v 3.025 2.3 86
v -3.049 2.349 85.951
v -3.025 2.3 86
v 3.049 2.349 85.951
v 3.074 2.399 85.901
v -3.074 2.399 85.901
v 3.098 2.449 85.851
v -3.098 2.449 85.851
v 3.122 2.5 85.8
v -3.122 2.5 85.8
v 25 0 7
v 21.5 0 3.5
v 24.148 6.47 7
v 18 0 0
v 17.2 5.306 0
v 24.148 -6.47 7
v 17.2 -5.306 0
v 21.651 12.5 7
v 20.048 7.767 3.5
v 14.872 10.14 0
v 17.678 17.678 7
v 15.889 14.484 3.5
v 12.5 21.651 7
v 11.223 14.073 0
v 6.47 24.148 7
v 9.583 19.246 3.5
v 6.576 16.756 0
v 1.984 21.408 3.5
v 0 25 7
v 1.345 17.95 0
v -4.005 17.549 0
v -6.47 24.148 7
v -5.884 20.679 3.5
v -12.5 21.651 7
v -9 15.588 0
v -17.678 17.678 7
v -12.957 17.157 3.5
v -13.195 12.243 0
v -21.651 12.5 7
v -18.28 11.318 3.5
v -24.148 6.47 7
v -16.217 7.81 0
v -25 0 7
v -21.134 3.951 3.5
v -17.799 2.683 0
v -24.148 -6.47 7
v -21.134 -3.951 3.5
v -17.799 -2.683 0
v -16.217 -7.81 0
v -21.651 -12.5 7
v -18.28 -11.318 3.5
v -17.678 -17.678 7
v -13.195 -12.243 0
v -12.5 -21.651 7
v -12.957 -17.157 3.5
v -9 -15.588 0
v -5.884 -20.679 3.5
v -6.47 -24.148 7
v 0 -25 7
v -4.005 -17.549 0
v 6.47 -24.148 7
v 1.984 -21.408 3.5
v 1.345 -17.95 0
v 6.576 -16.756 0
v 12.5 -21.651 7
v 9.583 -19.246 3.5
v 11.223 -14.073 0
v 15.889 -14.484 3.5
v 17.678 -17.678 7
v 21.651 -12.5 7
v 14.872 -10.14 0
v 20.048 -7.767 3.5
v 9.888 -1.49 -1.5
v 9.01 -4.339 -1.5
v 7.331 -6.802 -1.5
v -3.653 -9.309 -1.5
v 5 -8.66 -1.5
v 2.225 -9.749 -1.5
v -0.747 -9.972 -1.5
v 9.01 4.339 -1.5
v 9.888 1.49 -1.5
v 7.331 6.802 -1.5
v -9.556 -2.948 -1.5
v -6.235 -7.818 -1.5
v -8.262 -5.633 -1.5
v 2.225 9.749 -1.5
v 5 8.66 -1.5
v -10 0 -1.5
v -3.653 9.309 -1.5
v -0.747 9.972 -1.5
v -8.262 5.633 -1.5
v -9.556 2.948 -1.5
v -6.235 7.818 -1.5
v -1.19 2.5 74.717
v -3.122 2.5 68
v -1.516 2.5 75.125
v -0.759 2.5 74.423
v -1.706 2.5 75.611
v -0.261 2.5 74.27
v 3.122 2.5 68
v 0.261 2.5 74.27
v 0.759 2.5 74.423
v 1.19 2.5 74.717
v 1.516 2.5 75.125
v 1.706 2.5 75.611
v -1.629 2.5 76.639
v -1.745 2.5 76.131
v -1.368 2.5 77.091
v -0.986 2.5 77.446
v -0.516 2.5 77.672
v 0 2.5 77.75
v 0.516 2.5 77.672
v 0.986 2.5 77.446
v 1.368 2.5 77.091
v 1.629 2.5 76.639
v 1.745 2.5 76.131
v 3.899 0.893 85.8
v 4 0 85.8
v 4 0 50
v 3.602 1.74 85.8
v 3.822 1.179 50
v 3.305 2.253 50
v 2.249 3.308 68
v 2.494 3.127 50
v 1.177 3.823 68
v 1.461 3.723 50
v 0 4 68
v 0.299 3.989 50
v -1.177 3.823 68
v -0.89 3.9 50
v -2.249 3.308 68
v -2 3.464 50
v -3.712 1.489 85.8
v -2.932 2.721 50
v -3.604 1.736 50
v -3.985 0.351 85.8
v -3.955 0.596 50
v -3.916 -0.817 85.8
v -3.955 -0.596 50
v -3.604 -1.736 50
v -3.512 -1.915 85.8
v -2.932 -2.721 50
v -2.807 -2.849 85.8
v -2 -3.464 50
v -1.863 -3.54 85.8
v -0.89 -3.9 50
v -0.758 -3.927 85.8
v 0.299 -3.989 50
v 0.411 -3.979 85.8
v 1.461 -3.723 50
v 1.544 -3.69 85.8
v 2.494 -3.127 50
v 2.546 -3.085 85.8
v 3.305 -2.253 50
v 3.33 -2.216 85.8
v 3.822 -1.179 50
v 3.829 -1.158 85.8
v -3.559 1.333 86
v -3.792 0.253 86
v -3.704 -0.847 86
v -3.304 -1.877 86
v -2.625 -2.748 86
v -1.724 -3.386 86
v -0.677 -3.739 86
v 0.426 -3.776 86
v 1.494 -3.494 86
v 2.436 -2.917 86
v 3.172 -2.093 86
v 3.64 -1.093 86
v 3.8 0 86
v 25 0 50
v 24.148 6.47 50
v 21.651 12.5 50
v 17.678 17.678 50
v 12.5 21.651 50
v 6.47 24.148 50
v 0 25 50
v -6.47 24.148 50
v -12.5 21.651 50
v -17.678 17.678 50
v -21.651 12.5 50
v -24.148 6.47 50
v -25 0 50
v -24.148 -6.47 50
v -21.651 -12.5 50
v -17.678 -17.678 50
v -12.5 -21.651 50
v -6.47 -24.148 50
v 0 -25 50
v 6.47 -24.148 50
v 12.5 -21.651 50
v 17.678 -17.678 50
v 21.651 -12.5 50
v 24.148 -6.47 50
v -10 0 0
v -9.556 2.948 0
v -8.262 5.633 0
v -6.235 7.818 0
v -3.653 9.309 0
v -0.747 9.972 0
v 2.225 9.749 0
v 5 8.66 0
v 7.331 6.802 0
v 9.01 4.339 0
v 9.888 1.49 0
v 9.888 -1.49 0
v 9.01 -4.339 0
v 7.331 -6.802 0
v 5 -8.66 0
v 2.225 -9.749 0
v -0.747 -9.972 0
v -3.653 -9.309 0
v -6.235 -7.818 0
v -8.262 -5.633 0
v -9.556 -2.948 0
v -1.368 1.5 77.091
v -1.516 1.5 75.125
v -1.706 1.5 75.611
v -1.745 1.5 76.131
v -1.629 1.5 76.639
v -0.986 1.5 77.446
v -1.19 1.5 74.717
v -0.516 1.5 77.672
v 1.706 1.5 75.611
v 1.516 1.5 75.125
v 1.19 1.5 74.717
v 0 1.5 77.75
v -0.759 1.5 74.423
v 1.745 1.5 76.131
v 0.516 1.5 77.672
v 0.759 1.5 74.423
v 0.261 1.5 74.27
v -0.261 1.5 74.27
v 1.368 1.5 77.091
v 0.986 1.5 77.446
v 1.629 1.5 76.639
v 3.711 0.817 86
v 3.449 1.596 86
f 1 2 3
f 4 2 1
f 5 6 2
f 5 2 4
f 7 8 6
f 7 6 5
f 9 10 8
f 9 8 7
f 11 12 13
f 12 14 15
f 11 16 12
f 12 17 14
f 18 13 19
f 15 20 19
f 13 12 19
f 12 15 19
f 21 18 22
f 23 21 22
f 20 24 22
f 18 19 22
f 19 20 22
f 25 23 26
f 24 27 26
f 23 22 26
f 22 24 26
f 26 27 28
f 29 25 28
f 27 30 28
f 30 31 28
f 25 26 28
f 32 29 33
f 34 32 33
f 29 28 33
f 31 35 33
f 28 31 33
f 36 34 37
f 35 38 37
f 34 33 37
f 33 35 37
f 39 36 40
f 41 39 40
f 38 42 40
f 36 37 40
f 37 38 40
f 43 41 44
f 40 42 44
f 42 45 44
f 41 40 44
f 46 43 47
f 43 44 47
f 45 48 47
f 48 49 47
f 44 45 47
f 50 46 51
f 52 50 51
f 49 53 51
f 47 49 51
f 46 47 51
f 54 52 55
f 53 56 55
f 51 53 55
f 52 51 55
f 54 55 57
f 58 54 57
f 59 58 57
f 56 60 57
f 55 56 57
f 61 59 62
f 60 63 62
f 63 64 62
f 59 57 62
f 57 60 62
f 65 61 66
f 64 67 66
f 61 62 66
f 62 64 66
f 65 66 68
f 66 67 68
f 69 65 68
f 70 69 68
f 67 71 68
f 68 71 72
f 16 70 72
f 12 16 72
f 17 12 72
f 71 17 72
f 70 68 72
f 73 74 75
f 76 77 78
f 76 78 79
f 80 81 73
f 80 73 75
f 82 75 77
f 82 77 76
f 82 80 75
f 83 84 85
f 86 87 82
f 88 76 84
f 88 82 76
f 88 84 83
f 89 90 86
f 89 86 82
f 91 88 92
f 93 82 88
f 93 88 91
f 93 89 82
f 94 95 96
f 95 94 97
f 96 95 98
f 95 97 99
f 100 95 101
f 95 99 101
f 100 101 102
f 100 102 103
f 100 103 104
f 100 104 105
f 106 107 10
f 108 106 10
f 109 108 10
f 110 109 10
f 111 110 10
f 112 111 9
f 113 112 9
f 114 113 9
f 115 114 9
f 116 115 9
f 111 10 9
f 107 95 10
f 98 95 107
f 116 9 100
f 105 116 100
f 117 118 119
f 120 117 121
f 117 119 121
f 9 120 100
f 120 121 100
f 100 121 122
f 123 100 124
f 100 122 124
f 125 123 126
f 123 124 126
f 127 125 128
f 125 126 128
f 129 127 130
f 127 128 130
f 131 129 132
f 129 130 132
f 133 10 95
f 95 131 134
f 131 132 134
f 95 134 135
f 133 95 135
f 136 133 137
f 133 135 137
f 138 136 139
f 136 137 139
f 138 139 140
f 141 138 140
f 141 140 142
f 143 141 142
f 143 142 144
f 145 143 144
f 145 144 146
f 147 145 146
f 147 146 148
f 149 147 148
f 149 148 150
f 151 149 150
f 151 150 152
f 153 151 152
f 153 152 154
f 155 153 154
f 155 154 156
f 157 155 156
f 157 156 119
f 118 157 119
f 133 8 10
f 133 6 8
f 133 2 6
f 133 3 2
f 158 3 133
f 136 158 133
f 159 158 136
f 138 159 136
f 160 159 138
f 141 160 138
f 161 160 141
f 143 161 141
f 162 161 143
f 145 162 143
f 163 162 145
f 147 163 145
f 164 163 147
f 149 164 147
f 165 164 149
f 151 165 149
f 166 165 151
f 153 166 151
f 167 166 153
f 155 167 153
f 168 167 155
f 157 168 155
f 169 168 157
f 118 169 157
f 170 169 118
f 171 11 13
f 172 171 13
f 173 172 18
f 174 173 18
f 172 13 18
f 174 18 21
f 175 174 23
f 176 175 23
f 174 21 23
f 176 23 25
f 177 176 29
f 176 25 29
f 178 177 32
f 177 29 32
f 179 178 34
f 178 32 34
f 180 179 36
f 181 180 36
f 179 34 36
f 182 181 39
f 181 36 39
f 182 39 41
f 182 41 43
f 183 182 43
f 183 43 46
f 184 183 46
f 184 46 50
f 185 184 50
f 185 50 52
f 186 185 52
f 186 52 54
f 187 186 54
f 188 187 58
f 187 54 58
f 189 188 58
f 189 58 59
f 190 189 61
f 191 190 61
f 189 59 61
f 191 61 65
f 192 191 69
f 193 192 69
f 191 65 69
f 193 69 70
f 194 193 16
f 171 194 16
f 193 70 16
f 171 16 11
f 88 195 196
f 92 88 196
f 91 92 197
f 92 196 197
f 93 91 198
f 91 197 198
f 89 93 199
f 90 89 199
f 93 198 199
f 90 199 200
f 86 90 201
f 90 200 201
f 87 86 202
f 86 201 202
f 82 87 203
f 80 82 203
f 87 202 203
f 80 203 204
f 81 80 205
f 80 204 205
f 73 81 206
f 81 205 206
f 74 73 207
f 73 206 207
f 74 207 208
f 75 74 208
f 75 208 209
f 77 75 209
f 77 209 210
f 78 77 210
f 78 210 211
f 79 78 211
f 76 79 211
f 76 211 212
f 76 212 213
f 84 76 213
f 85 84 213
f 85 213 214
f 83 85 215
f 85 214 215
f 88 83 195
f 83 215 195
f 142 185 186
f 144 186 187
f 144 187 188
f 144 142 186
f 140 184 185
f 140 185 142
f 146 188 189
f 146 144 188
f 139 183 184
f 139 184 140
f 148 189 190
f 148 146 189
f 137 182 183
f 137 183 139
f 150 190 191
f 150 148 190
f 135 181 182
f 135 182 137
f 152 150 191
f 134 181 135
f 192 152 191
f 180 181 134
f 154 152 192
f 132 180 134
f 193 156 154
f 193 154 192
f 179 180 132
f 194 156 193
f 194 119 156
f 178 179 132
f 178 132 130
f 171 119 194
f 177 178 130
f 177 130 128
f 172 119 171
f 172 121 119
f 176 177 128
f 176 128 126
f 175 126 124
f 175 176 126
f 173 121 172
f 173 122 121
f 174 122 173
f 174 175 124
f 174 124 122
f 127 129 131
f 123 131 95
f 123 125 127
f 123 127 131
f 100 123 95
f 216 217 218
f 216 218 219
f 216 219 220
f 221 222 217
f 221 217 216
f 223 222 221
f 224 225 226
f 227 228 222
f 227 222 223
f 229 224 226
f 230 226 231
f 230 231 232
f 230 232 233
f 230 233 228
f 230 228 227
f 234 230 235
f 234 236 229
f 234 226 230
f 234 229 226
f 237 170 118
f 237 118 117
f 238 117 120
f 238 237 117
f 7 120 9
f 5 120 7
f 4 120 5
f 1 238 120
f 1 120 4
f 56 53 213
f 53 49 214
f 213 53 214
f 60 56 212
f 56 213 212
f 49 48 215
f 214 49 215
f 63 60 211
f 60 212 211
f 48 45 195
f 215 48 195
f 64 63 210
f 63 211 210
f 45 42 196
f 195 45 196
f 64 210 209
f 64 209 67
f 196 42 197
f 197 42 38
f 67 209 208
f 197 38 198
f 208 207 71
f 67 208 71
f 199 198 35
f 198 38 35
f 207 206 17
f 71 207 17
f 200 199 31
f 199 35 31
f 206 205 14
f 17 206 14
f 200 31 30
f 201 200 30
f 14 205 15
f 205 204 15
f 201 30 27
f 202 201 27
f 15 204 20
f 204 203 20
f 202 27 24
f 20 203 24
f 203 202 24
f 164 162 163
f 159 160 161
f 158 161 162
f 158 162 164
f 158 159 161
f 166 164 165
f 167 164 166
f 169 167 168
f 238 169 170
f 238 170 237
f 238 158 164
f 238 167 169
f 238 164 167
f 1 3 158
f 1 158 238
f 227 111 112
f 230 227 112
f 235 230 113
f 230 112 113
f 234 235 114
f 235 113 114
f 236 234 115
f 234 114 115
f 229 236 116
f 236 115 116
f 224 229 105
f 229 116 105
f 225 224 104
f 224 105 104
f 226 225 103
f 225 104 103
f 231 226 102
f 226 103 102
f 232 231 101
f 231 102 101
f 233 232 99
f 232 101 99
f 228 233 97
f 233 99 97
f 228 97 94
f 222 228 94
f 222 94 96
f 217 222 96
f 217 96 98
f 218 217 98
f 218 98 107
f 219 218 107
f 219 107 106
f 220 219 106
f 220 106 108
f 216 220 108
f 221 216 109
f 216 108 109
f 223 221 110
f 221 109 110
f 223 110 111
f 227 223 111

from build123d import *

# Parameters (mm, degrees)
SKETCH_1_R          = 25
EXTRUDE_1_DEPTH     = 50
CHAMFER_1_SIZE      = 7
SKETCH_2_R          = 10
EXTRUDE_2_DEPTH     = 1.5
SKETCH_3_R          = 4
EXTRUDE_3_DEPTH     = 36
CUT_EXTRUDE_1_DEPTH = 18
SKETCH_5_R          = 1.75
CUT_EXTRUDE_2_DEPTH = 1
CHAMFER_2_SIZE      = 0.2


with BuildPart() as part:
    # 草图1 → 凸台-拉伸1 (new body)
    with BuildSketch(Plane.XY):
        Circle(SKETCH_1_R)
    extrude(amount=EXTRUDE_1_DEPTH)

    # 倒角1
    chamfer_1_edges = [part.edges().sort_by_distance(p)[0] for p in [
        (-25, 0, 0),
    ]]
    chamfer(chamfer_1_edges, length=CHAMFER_1_SIZE)

    # 草图2 → 凸台-拉伸2 (add)
    with BuildSketch(Plane(origin=(0, 0, 0), x_dir=(-1, 0, 0), z_dir=(0, 0, -1))):
        Circle(SKETCH_2_R)
    extrude(amount=EXTRUDE_2_DEPTH)

    # 草图3 → 凸台-拉伸3 (add)
    with BuildSketch(Plane.XY.offset(50)):
        Circle(SKETCH_3_R)
    extrude(amount=EXTRUDE_3_DEPTH)

    # 草图4 → 切除-拉伸1 (cut)
    with BuildSketch(Plane.XY.offset(86)):
        Polygon((-91.7895175, 2.5), (-3.122498999, 2.5), (3.122498999, 2.5), (91.7895175, 2.5), (91.7895175, 179.834037002), (-91.7895175, 179.834037002), align=None)
    extrude(amount=-CUT_EXTRUDE_1_DEPTH, mode=Mode.SUBTRACT)

    # 草图5 → 切除-拉伸2 (cut)
    with BuildSketch(Plane(origin=(0, 2.5, 0), x_dir=(1, 0, 0), z_dir=(0, 1, 0))):
        with Locations(Location((0, -76, 0), (0, 0, 270))):
            Circle(SKETCH_5_R)
    extrude(amount=-CUT_EXTRUDE_2_DEPTH, mode=Mode.SUBTRACT)

    # 倒角2
    chamfer_2_edges = [part.edges().sort_by_distance(p)[0] for p in [
        (-1.324764885, -3.774254628, 86),
        (0, 2.5, 86),
    ]]
    chamfer(chamfer_2_edges, length=CHAMFER_2_SIZE)


solid = part.part
